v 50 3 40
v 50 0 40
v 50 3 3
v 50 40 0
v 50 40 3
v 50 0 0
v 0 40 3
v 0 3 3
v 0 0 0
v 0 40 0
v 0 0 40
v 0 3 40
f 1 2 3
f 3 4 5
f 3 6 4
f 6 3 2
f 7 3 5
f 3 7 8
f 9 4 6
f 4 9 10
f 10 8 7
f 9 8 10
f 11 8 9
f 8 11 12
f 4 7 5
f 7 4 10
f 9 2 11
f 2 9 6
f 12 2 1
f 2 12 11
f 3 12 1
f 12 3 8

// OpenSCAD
$fn = 64;

// パラメータ
width = 50;
depth = 40;
height = 40;
thickness = 3;

hole_diameter = 4.5;
countersink_diameter = 8;
countersink_depth = 2;
edge_offset = 10;

module countersunk_hole() {
    // 貫通穴
    cylinder(d = hole_diameter, h = thickness + 0.1, center = false);
    // 皿座面
    translate([0, 0, thickness - countersink_depth])
        cylinder(d1 = hole_diameter, d2 = countersink_diameter, h = countersink_depth + 0.1);
}

difference() {
    // L字ブラケット本体
    union() {
        // 水平面
        translate([0, 0, 0])
            cube([width, depth, thickness]);
        // 垂直面
        translate([0, 0, 0])
            cube([width, thickness, height]);
    }
    
    // 水平面の皿穴（外側 = 下面から）
    translate([width/2 - (width/2 - edge_offset), edge_offset, 0]) {
        translate([0, 0, -0.05])
            mirror([0, 0, 1])
            countersunk_hole();
    }
    translate([width/2 + (width/2 - edge_offset), edge_offset, 0]) {
        translate([0, 0, -0.05])
            mirror([0, 0, 1])
            countersunk_hole();
    }
    
    // 垂直面の皿穴（外側 = 前面から）
    translate([width/2 - (width/2 - edge_offset), 0, edge_offset]) {
        rotate([-90, 0, 0])
            translate([0, 0, -0.05])
            mirror([0, 0, 1])
            countersunk_hole();
    }
    translate([width/2 + (width/2 - edge_offset), 0, edge_offset]) {
        rotate([-90, 0, 0])
            translate([0, 0, -0.05])
            mirror([0, 0, 1])
            countersunk_hole();
    }
}
